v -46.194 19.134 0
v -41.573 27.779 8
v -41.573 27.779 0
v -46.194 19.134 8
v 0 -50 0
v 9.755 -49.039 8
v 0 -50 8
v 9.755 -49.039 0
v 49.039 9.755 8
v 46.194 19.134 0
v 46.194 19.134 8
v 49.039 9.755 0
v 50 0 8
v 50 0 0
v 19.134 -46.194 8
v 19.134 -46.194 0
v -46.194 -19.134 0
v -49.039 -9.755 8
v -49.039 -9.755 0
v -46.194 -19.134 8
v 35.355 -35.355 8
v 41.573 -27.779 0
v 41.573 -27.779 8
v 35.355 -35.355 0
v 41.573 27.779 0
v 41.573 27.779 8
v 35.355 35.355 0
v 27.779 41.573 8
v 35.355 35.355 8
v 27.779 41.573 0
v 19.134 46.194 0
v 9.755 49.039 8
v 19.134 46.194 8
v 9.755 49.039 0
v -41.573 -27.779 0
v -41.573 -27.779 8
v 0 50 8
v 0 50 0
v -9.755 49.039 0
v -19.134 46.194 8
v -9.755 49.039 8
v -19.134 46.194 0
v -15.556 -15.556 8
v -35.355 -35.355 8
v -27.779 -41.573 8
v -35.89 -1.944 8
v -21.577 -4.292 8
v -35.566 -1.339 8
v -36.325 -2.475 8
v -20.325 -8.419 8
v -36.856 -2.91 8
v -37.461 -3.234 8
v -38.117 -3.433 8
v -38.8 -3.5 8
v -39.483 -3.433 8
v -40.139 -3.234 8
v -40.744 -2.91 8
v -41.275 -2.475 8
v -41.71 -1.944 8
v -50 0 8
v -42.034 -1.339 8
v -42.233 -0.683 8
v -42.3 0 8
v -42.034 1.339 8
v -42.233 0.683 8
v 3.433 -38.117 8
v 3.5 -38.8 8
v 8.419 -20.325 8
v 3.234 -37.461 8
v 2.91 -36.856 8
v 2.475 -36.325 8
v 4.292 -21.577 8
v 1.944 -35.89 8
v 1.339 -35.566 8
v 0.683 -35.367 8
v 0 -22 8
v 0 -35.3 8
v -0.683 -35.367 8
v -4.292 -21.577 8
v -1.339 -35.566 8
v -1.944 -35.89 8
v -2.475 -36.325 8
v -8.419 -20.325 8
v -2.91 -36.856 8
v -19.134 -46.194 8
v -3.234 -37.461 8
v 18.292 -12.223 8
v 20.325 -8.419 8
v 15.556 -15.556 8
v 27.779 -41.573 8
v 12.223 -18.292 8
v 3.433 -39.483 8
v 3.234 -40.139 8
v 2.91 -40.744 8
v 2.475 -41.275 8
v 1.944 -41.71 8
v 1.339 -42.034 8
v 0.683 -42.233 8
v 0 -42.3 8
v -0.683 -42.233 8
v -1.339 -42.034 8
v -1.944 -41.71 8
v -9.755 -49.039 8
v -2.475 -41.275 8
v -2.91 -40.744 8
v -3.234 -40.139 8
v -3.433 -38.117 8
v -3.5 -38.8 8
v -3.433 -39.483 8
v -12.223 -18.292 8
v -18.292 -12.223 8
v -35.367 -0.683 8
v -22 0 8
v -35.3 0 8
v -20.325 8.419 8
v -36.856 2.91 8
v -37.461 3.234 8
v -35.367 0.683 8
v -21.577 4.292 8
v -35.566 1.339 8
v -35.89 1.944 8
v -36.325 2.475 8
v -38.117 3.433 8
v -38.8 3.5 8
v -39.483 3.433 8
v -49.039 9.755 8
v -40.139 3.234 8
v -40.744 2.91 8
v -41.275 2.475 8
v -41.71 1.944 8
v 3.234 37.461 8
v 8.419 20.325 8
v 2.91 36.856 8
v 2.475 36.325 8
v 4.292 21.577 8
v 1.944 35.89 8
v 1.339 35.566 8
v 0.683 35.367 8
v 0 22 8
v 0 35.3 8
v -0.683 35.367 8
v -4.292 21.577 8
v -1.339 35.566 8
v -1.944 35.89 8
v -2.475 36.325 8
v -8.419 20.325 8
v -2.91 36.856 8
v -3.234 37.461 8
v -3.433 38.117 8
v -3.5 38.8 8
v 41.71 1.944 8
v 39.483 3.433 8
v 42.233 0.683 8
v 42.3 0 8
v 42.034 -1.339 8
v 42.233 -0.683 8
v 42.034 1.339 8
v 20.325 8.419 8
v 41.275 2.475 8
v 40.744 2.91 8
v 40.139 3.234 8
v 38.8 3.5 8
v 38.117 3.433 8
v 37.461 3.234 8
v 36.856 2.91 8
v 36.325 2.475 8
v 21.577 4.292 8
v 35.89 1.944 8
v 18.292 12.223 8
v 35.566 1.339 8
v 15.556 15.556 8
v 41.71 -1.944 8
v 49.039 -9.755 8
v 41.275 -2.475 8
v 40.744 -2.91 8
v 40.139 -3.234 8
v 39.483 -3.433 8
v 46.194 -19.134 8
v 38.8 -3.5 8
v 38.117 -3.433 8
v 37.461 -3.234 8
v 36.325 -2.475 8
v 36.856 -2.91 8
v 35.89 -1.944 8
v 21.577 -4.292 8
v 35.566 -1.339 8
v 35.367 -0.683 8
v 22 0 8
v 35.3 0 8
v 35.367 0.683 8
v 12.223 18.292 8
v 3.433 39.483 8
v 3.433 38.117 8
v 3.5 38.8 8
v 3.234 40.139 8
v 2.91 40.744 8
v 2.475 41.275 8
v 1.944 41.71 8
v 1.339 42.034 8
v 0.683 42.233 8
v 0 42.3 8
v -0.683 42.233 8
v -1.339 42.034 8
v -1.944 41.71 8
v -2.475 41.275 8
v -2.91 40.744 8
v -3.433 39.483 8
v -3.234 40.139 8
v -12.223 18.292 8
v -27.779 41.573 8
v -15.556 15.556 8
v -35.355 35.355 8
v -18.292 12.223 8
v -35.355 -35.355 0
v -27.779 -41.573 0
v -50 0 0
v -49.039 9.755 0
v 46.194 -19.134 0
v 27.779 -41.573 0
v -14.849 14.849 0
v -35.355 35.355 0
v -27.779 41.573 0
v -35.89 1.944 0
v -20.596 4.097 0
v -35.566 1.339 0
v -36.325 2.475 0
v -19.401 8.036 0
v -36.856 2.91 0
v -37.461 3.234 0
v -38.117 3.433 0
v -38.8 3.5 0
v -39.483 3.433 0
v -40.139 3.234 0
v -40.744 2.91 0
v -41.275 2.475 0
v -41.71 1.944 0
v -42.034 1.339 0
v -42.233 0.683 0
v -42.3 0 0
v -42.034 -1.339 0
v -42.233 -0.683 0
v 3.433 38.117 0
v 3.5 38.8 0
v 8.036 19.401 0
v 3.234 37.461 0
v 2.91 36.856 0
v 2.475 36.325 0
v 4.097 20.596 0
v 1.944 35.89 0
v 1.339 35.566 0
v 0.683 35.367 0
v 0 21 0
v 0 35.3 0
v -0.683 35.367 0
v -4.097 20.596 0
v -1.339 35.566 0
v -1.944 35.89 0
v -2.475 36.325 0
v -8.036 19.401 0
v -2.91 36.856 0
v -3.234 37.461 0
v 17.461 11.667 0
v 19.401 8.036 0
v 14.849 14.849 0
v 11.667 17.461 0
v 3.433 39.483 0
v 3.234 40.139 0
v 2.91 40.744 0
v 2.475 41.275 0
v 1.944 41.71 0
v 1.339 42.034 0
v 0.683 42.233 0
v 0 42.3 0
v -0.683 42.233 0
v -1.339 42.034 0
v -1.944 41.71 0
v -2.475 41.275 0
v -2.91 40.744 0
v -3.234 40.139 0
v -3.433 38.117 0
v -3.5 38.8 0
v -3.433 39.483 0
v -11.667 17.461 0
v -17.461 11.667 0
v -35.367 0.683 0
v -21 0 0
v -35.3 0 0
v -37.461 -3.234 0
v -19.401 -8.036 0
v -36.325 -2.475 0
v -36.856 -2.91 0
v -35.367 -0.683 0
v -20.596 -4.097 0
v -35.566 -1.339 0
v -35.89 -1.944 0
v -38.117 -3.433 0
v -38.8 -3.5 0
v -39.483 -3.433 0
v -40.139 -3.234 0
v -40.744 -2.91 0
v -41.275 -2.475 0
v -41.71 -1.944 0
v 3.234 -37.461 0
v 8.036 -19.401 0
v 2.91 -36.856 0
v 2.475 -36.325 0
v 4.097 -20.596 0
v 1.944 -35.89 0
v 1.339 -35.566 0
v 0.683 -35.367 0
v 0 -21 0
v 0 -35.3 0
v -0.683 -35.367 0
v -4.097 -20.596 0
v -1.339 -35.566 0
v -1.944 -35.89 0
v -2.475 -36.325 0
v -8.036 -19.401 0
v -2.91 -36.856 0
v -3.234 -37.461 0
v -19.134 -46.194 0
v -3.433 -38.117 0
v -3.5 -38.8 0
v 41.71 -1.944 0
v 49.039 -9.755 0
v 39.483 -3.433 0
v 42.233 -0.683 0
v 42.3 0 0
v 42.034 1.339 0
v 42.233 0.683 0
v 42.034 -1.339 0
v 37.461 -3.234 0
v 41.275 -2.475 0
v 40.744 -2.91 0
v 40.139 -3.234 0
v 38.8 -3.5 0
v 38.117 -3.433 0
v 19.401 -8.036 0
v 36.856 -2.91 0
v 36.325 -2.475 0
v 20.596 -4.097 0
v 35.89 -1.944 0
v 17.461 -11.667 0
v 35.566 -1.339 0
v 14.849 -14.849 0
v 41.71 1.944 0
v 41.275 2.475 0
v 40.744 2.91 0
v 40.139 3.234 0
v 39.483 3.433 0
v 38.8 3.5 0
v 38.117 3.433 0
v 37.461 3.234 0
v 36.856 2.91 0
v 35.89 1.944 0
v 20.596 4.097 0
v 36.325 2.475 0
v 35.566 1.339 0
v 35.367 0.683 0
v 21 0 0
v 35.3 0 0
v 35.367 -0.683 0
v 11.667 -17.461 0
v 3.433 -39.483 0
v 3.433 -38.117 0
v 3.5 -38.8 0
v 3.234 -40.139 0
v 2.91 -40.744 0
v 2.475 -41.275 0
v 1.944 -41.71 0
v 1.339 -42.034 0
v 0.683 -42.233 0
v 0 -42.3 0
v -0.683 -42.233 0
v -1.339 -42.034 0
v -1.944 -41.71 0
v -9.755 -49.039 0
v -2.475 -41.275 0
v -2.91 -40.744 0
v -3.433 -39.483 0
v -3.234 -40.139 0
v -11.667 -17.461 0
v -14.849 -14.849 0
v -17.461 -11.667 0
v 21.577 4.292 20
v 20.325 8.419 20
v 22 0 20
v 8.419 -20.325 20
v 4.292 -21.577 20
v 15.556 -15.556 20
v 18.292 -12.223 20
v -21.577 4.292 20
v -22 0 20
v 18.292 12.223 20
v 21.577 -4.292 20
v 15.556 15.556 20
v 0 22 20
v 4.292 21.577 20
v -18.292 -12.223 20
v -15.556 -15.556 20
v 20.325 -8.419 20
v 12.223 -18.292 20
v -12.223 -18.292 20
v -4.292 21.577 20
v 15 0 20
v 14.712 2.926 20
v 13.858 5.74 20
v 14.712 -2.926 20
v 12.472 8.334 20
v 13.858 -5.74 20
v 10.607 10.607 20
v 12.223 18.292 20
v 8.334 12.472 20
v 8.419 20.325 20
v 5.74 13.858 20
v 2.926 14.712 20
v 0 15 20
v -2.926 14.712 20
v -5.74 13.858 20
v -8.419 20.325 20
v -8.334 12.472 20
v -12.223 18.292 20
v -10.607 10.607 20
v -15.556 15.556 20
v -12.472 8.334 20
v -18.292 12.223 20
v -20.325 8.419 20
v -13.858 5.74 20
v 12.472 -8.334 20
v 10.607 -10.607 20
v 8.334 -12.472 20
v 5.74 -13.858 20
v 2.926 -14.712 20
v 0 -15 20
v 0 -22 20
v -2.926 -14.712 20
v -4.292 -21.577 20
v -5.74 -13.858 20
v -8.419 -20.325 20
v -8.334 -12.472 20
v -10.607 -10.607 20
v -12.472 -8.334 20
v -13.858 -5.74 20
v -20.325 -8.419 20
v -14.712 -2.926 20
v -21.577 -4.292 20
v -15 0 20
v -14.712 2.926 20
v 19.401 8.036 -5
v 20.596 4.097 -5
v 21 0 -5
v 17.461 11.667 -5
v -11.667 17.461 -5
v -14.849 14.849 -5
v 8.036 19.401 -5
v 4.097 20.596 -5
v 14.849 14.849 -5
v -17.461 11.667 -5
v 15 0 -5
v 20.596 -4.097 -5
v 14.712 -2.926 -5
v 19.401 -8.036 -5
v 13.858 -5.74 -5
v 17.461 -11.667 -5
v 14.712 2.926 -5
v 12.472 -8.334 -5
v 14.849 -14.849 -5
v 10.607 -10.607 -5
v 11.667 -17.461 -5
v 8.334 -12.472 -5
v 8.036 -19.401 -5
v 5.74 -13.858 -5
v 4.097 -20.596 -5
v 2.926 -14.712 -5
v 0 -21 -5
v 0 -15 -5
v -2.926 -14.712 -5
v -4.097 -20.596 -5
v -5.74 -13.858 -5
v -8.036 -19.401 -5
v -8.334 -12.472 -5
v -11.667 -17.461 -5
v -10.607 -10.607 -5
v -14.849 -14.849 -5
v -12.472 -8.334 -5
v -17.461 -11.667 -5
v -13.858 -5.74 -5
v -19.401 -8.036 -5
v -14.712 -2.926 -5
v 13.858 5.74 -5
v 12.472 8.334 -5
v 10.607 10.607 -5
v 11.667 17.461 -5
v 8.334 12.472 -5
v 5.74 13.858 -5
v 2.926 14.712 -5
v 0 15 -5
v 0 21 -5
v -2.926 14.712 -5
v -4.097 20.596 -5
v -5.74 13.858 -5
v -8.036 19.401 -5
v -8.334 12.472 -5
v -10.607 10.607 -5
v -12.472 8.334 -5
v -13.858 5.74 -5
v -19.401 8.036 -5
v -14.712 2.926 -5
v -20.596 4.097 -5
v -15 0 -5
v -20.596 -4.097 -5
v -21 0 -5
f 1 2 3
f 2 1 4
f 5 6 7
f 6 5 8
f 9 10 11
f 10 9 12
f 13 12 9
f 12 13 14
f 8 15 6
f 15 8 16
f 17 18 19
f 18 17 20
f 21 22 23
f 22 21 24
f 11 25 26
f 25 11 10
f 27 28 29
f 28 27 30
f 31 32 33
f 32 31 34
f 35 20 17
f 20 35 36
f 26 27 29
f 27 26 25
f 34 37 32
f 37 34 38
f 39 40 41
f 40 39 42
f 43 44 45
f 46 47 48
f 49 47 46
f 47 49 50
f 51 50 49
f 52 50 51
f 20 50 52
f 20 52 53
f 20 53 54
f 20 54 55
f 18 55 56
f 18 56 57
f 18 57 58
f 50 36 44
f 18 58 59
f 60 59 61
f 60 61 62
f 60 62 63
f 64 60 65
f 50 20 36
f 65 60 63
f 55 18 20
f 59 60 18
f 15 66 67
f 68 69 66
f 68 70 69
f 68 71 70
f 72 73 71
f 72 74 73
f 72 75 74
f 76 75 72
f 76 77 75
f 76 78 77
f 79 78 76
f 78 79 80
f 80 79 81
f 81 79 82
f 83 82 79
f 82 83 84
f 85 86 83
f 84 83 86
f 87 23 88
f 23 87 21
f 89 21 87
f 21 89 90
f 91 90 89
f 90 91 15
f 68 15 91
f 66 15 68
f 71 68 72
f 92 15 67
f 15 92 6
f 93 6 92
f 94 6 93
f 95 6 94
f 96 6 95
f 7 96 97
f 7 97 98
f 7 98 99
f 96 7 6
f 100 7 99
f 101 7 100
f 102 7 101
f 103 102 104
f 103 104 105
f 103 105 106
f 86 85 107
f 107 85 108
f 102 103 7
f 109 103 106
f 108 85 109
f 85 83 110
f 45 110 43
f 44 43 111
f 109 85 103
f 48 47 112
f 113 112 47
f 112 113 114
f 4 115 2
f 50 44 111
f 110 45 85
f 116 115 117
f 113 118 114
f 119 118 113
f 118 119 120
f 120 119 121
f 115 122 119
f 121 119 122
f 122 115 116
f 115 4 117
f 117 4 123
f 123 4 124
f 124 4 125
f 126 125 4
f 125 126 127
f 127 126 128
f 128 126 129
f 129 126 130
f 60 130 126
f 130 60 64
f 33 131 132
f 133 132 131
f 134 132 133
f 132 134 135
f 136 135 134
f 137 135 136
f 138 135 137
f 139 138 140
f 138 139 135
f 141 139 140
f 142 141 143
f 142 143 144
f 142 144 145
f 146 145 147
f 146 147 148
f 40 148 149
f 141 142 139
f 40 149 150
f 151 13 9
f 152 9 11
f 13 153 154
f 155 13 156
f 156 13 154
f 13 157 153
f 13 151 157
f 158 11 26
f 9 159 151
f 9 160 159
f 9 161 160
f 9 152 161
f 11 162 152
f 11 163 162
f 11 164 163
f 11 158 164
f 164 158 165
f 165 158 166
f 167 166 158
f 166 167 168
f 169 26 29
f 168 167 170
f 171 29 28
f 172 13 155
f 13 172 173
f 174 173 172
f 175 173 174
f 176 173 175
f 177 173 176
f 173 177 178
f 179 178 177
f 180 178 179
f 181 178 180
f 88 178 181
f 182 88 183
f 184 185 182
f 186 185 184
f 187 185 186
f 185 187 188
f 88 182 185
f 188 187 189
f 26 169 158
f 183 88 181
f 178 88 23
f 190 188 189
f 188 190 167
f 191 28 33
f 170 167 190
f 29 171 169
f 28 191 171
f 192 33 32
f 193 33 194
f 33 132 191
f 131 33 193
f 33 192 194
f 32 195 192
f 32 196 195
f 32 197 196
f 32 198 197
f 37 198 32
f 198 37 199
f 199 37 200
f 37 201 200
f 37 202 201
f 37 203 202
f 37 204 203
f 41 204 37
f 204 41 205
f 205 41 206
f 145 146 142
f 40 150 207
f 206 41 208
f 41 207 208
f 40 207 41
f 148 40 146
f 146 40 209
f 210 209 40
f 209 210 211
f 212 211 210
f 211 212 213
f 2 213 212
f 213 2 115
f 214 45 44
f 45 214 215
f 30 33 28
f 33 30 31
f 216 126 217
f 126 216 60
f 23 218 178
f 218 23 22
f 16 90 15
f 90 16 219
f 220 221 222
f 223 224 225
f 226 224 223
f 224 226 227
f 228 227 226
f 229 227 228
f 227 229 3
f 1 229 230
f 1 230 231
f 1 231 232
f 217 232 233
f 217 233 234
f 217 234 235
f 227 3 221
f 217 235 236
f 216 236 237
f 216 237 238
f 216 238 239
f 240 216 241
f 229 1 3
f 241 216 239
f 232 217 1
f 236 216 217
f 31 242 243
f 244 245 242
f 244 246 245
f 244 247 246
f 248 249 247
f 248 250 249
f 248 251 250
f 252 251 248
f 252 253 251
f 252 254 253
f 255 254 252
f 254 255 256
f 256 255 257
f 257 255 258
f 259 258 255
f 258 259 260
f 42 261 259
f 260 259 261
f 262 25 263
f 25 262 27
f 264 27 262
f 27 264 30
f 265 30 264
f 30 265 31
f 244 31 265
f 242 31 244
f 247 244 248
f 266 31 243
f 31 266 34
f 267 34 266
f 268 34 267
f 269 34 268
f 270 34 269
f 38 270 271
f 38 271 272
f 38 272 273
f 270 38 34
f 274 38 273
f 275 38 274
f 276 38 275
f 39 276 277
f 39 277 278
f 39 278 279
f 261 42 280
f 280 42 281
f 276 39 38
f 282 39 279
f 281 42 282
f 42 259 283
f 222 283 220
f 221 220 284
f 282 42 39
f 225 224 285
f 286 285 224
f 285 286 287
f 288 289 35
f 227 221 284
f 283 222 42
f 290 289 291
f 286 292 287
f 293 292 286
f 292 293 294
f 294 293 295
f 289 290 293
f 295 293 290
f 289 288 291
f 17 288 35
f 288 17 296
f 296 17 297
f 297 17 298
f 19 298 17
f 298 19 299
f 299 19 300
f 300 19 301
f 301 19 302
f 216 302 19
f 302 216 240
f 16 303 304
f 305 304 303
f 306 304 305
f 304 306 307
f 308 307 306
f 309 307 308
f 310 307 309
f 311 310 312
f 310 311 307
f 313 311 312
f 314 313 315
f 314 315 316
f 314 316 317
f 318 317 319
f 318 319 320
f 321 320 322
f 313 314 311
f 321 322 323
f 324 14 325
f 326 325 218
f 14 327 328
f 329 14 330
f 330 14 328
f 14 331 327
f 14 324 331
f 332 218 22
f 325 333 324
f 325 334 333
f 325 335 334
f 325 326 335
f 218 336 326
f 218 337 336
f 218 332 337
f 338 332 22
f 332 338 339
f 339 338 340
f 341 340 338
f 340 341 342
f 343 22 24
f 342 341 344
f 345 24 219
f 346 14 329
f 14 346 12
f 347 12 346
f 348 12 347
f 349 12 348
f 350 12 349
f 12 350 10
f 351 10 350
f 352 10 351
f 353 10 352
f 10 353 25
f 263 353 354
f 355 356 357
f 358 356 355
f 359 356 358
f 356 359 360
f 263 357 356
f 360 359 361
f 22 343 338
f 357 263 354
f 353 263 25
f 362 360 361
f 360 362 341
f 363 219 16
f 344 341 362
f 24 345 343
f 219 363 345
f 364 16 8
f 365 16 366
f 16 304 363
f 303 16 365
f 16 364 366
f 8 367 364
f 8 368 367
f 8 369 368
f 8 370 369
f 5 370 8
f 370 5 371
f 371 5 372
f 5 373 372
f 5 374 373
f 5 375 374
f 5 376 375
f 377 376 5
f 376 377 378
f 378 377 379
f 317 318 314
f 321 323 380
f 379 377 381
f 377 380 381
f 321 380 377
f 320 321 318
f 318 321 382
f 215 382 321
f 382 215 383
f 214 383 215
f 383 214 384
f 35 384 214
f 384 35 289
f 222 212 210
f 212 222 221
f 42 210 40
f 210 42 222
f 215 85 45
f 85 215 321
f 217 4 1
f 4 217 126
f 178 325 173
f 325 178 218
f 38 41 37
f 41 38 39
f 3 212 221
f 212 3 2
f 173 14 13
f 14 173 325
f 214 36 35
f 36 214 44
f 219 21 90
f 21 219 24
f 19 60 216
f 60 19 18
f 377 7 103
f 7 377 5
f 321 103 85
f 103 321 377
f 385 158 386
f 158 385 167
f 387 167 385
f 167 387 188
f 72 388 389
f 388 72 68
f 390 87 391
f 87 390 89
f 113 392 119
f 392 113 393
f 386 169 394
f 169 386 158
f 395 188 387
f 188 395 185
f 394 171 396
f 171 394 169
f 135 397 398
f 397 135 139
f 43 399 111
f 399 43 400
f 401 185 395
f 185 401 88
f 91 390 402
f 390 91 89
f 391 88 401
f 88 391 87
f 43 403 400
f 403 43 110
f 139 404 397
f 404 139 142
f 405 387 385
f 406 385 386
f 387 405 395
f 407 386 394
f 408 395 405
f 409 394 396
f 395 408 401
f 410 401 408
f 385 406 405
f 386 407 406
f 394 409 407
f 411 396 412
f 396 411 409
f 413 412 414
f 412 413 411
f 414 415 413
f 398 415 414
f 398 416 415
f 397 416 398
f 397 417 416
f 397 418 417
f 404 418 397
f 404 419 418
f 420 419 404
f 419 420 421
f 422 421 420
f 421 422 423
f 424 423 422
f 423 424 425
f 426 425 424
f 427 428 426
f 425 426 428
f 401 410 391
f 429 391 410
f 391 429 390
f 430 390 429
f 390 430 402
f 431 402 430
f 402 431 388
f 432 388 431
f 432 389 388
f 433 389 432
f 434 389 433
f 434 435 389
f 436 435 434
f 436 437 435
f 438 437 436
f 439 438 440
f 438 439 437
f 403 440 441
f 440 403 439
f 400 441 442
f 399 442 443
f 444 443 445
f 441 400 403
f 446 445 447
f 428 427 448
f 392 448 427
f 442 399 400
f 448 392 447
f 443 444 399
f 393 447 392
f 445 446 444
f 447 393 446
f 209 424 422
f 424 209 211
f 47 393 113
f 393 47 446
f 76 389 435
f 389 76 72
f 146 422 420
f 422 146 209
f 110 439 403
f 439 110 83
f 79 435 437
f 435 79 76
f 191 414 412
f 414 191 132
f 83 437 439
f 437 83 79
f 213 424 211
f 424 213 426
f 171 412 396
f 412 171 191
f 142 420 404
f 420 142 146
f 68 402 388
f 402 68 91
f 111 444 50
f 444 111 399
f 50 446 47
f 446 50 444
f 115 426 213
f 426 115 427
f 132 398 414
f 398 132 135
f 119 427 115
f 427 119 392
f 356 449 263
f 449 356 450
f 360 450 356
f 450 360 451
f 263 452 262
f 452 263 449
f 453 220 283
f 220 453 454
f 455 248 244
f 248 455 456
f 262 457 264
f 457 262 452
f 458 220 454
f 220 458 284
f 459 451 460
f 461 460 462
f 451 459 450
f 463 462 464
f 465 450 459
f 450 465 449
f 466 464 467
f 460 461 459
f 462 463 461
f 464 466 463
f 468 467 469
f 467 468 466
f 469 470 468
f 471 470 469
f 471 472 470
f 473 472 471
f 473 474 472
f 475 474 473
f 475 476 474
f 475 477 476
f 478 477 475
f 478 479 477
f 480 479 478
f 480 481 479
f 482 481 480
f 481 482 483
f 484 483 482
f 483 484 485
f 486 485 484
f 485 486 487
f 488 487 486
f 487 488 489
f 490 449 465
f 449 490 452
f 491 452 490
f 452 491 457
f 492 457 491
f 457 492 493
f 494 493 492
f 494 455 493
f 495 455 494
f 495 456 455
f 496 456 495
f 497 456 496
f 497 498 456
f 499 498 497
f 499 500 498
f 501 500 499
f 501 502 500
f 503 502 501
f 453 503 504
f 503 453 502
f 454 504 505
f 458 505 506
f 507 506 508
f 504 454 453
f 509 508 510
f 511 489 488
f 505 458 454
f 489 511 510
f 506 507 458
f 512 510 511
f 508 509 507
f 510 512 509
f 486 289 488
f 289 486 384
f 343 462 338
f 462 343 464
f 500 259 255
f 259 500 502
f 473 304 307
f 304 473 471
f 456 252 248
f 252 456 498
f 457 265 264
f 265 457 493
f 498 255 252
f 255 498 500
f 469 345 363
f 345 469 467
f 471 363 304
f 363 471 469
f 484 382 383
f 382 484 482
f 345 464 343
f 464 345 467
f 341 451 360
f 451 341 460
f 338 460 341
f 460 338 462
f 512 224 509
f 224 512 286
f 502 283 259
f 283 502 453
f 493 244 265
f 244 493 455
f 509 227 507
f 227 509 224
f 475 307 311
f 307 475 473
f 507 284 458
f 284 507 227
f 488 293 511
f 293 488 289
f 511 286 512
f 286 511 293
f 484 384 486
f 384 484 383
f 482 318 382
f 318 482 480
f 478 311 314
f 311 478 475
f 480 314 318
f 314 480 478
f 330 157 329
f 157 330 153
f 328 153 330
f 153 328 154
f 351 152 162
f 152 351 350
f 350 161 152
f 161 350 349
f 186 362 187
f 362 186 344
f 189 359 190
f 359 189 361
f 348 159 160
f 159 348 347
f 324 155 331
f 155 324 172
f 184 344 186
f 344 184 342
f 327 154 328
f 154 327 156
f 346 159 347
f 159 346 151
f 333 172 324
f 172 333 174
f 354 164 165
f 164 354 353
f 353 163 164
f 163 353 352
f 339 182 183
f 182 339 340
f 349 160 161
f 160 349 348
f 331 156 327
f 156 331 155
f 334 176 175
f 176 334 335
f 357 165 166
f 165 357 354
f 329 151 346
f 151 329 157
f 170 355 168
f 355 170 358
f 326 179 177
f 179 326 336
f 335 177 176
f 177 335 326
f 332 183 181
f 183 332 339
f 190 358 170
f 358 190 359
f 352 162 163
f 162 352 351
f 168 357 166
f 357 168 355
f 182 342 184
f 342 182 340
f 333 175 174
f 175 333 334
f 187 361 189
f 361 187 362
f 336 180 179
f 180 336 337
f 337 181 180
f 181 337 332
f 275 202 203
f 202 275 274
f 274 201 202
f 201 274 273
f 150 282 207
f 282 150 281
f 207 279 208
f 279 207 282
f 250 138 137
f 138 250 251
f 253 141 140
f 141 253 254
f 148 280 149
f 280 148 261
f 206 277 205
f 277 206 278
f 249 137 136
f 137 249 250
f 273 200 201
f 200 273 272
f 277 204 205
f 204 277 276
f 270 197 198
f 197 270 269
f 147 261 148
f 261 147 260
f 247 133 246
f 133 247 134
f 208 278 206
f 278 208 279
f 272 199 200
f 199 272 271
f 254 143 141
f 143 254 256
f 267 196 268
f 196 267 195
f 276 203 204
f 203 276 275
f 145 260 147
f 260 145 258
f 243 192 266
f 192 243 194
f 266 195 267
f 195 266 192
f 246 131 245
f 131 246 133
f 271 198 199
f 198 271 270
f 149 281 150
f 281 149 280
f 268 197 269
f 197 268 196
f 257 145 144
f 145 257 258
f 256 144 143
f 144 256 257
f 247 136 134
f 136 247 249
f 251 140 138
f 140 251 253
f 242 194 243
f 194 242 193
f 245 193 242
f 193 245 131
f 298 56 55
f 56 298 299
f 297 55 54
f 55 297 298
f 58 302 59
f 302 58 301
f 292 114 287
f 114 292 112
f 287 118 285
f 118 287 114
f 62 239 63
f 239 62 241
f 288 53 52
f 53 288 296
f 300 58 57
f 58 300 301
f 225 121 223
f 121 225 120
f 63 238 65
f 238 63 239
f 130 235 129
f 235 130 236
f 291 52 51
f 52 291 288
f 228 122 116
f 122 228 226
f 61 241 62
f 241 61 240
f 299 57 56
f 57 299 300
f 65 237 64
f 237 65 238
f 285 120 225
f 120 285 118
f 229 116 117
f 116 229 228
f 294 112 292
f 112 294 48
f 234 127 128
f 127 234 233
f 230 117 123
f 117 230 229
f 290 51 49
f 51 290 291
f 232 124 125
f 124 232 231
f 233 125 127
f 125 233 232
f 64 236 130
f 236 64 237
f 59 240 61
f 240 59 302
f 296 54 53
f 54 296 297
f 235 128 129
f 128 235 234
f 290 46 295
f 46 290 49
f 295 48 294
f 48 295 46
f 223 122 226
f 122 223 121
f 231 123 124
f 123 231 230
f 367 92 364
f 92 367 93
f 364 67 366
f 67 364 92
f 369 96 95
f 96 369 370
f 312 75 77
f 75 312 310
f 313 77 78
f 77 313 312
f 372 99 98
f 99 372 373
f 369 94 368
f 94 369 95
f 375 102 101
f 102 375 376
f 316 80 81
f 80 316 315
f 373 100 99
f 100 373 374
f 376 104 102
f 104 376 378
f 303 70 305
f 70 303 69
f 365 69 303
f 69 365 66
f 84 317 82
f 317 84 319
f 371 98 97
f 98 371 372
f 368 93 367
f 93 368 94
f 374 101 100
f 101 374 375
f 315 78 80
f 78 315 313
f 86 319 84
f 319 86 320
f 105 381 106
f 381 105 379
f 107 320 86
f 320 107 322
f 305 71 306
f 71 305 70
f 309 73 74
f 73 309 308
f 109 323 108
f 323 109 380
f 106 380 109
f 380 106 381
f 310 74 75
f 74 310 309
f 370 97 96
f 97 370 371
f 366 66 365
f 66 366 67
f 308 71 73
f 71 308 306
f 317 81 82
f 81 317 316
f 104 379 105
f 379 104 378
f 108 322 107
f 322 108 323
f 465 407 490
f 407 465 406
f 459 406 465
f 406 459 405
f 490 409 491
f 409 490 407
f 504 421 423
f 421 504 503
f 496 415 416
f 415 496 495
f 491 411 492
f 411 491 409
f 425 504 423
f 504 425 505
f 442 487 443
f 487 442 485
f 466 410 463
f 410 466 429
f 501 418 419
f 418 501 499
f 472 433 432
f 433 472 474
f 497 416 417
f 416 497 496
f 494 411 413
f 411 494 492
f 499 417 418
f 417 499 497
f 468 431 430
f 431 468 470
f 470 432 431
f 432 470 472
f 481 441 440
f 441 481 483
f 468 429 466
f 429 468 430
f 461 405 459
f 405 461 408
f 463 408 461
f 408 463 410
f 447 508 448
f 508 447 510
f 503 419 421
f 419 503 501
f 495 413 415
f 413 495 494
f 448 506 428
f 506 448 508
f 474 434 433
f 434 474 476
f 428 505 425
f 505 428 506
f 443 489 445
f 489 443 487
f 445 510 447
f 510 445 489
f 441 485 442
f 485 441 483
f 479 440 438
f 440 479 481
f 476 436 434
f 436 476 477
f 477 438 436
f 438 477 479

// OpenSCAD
$fn = 32;

// ----------------------------------------------------------------------
// Bolt-circle flange: 100 mm outside, 4 bolt holes, bore 30 mm
// ----------------------------------------------------------------------

// --- parameters (mm) ---
flange_d = 100;           // flange outside diameter
flange_t = 8;             // flange thickness
bolts = 4;                // number of bolt holes
bolt_d = 7;               // bolt clearance
bolt_r = 38.8;            // bolt circle radius
bore_d = 30;              // centre bore
hub_d = 44;               // raised hub diameter
hub_h = 12;               // raised hub height
spigot_d = 42;            // spigot diameter
spigot_h = 6;             // spigot height below the flange
sink = 1;                 // overlap into the flange

module body() {
  cylinder(h = flange_t, d = flange_d);
  /* raised hub, sunk 1 mm into the flange */
  translate([0, 0, flange_t - 1]) cylinder(h = hub_h + 1, d = hub_d);
  /* spigot on the back face, sunk into the flange */
  translate([0, 0, -spigot_h + sink]) cylinder(h = spigot_h, d = spigot_d);
}

difference() {
  body();
  /* bolt circle */
  for (i = [0 : bolts - 1]) rotate([0, 0, i * 360 / bolts]) translate([bolt_r, 0, -spigot_h - 1]) cylinder(h = flange_t + hub_h + spigot_h + 3, d = bolt_d);
  translate([0, 0, -spigot_h - 1]) cylinder(h = flange_t + hub_h + spigot_h + 3, d = bore_d);
}
